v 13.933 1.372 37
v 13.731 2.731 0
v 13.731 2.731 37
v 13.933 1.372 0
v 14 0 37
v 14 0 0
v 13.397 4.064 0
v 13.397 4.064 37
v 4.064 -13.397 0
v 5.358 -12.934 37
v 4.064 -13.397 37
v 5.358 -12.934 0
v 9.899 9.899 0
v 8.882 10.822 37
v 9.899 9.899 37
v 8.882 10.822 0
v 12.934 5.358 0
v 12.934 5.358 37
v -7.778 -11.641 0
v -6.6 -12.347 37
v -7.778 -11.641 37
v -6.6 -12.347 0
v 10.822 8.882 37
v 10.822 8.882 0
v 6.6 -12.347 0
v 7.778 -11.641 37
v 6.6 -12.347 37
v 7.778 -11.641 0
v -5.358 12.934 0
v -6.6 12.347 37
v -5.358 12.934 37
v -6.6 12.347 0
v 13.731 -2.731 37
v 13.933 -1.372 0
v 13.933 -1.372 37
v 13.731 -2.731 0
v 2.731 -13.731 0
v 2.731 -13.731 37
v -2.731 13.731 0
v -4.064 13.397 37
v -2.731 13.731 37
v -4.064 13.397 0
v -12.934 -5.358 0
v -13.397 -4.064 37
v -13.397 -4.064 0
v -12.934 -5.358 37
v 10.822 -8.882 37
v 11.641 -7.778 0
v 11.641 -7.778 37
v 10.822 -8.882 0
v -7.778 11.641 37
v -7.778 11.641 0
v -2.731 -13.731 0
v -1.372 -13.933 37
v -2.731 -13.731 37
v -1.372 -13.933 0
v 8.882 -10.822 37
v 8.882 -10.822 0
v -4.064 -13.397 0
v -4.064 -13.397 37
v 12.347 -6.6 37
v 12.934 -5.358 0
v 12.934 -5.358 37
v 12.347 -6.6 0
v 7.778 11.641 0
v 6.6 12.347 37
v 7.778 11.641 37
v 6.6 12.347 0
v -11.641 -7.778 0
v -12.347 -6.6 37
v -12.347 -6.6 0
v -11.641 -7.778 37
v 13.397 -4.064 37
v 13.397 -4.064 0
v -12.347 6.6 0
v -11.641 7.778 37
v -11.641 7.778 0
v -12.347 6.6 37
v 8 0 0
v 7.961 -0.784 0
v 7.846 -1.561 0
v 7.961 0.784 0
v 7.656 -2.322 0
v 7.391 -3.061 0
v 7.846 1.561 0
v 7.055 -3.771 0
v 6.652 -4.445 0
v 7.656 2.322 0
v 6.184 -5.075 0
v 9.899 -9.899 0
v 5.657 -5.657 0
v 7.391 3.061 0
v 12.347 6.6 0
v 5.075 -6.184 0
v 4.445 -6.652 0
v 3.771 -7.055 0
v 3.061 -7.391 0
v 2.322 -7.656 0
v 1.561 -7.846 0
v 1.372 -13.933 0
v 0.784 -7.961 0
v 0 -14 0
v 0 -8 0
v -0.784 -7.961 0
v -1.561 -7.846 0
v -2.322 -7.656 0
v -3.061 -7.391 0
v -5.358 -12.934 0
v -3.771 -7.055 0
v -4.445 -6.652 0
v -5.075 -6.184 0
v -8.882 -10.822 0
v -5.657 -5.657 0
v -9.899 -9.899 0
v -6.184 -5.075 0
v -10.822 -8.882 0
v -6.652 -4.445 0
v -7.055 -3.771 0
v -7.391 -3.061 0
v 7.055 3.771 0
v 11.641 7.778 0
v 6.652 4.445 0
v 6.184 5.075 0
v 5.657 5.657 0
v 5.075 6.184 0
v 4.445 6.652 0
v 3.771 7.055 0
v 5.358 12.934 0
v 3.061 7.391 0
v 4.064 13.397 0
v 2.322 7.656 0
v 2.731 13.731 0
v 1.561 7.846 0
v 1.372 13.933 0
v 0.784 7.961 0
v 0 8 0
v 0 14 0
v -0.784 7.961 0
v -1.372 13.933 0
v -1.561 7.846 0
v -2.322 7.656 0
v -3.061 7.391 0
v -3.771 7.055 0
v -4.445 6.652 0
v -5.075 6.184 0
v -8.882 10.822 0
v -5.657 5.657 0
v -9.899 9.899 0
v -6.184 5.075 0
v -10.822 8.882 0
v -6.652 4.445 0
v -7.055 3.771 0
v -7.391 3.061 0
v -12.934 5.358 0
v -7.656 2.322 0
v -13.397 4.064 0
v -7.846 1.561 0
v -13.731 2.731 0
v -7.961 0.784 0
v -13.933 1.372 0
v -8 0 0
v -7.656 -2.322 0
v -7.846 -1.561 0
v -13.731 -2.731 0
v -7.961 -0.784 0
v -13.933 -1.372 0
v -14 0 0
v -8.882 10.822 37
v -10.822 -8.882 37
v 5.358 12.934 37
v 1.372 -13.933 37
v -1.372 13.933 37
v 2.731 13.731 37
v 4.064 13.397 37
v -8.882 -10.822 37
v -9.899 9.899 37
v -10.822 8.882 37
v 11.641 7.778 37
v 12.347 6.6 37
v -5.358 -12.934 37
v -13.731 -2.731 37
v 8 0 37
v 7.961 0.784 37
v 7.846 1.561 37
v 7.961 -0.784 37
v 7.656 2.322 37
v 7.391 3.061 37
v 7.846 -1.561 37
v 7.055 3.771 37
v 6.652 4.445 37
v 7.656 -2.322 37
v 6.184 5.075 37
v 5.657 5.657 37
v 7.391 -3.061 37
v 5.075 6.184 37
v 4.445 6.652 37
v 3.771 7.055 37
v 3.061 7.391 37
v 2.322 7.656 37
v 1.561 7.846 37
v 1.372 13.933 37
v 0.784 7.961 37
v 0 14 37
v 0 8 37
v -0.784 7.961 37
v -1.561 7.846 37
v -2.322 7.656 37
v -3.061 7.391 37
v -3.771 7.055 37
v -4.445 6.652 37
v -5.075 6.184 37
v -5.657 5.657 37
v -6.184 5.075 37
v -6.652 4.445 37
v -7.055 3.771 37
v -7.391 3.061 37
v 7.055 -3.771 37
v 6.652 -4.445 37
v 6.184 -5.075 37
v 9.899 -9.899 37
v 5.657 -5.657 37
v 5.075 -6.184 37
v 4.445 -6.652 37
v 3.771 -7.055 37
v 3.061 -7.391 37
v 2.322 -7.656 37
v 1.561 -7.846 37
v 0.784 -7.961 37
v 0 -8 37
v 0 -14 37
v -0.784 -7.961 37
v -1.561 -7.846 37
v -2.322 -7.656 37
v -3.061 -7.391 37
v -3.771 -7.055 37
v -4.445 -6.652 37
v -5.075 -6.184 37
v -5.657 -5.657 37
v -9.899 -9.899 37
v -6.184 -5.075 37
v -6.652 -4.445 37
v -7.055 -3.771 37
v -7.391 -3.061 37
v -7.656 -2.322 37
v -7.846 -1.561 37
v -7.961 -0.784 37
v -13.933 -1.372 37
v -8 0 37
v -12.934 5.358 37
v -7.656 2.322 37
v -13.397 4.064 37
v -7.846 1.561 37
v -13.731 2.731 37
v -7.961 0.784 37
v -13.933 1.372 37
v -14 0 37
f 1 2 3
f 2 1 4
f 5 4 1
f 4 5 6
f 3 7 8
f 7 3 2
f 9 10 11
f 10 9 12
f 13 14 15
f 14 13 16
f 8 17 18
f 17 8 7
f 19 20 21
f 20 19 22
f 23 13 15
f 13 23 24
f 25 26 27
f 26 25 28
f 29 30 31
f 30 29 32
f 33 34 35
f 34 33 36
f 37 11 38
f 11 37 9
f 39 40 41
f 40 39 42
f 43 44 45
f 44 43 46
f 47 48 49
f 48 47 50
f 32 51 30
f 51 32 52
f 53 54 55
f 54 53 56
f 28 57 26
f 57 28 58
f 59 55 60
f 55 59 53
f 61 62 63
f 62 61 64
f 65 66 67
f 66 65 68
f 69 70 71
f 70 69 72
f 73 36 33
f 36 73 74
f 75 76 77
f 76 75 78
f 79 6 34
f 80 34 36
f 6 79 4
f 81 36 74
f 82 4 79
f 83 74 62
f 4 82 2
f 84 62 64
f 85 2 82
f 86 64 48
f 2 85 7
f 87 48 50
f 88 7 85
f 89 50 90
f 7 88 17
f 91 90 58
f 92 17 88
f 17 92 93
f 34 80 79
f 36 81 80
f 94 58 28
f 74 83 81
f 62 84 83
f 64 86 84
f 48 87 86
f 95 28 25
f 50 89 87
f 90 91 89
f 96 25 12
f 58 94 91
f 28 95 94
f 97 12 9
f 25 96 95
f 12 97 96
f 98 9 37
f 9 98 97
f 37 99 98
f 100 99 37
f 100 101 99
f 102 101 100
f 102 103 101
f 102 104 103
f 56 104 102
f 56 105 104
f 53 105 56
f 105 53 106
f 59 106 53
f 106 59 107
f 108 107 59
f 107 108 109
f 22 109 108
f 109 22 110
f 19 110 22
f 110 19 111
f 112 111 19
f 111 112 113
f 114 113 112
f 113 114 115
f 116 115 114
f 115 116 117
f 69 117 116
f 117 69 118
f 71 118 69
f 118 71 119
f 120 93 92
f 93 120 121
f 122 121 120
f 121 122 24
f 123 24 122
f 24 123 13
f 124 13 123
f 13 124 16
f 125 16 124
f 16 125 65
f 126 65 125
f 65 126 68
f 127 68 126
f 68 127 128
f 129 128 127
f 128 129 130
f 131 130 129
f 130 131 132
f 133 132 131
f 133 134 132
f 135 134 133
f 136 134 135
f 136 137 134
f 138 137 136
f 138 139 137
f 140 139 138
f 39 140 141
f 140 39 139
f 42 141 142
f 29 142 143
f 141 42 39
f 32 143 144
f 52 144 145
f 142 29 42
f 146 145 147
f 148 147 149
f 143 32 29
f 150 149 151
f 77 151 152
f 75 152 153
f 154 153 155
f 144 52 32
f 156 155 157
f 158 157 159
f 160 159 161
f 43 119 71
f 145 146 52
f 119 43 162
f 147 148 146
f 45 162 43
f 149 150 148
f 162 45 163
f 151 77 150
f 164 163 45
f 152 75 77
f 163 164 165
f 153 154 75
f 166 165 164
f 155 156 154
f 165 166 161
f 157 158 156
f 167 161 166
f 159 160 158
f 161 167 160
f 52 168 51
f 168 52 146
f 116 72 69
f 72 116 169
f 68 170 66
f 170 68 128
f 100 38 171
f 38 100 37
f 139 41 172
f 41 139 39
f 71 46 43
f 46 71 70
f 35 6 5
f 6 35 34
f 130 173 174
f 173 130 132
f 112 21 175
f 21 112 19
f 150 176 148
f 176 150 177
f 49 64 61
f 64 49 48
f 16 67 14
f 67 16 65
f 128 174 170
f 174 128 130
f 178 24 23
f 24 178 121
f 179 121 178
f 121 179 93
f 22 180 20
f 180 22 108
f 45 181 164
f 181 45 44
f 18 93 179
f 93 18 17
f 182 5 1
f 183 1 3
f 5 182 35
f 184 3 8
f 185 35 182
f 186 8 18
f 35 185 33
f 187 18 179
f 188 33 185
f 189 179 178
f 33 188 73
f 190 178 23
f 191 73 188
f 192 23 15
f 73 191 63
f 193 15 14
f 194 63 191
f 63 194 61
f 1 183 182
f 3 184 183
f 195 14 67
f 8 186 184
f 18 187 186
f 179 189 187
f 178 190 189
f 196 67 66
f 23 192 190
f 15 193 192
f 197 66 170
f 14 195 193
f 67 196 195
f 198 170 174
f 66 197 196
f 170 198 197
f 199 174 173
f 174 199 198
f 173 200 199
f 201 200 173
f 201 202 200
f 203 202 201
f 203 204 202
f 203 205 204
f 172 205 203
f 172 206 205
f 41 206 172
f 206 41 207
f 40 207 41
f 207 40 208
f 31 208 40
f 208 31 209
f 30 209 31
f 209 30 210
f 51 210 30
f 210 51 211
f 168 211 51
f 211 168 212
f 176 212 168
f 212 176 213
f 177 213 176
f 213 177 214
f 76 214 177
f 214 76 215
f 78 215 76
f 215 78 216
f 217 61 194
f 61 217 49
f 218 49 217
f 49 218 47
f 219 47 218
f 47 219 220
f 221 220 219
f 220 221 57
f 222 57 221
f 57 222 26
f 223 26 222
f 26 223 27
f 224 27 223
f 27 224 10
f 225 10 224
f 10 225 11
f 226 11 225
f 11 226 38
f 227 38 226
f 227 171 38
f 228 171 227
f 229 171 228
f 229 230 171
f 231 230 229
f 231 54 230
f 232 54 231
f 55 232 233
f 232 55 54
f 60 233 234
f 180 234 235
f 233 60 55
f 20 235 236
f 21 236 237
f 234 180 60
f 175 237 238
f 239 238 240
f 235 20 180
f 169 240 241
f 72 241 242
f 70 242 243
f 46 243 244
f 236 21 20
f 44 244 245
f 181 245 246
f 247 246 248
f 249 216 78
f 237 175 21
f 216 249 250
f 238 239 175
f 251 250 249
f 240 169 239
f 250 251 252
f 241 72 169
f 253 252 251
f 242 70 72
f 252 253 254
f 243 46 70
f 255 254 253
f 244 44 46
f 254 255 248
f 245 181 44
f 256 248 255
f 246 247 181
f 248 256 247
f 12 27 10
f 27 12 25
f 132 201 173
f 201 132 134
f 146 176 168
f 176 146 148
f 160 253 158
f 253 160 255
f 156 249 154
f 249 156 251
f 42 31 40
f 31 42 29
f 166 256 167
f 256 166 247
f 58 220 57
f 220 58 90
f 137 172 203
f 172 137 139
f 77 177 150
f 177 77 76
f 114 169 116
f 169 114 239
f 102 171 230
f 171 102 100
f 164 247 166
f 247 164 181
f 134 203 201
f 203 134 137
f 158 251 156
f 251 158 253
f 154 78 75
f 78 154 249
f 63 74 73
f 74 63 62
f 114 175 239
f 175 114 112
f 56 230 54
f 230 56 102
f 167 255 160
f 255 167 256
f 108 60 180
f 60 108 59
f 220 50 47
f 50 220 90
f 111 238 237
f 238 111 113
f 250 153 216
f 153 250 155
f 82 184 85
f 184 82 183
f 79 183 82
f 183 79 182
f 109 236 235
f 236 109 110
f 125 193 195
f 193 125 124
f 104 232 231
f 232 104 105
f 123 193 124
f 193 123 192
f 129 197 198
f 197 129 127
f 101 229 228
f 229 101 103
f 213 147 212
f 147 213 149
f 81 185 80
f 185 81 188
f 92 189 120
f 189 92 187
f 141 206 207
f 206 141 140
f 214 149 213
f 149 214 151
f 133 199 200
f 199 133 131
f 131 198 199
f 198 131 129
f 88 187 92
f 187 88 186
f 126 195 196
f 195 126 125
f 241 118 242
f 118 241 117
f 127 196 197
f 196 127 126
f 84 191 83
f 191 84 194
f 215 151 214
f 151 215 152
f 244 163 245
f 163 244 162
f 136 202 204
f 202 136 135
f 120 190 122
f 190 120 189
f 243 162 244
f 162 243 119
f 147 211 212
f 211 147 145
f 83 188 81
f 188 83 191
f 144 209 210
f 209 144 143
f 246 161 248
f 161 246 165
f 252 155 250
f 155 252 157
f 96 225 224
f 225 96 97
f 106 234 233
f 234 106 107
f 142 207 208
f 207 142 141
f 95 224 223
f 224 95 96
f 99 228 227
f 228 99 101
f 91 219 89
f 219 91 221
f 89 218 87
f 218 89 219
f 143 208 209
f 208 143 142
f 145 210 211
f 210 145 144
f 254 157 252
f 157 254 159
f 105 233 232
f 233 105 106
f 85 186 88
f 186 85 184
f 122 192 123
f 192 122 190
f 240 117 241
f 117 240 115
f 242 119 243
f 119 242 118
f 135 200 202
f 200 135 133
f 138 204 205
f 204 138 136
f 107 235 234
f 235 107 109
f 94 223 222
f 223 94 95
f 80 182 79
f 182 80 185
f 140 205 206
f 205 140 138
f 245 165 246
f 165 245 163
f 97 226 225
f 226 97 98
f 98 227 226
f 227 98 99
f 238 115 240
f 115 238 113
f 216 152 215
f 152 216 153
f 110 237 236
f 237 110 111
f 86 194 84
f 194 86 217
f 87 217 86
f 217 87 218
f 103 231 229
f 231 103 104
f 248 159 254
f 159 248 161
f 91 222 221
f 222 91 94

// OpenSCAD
difference() {
    cylinder(h=37.0, d=28.0, $fn=64);
    translate([0, 0, -1]) {
        cylinder(h=39.0, d=16.0, $fn=64);
    }
}
